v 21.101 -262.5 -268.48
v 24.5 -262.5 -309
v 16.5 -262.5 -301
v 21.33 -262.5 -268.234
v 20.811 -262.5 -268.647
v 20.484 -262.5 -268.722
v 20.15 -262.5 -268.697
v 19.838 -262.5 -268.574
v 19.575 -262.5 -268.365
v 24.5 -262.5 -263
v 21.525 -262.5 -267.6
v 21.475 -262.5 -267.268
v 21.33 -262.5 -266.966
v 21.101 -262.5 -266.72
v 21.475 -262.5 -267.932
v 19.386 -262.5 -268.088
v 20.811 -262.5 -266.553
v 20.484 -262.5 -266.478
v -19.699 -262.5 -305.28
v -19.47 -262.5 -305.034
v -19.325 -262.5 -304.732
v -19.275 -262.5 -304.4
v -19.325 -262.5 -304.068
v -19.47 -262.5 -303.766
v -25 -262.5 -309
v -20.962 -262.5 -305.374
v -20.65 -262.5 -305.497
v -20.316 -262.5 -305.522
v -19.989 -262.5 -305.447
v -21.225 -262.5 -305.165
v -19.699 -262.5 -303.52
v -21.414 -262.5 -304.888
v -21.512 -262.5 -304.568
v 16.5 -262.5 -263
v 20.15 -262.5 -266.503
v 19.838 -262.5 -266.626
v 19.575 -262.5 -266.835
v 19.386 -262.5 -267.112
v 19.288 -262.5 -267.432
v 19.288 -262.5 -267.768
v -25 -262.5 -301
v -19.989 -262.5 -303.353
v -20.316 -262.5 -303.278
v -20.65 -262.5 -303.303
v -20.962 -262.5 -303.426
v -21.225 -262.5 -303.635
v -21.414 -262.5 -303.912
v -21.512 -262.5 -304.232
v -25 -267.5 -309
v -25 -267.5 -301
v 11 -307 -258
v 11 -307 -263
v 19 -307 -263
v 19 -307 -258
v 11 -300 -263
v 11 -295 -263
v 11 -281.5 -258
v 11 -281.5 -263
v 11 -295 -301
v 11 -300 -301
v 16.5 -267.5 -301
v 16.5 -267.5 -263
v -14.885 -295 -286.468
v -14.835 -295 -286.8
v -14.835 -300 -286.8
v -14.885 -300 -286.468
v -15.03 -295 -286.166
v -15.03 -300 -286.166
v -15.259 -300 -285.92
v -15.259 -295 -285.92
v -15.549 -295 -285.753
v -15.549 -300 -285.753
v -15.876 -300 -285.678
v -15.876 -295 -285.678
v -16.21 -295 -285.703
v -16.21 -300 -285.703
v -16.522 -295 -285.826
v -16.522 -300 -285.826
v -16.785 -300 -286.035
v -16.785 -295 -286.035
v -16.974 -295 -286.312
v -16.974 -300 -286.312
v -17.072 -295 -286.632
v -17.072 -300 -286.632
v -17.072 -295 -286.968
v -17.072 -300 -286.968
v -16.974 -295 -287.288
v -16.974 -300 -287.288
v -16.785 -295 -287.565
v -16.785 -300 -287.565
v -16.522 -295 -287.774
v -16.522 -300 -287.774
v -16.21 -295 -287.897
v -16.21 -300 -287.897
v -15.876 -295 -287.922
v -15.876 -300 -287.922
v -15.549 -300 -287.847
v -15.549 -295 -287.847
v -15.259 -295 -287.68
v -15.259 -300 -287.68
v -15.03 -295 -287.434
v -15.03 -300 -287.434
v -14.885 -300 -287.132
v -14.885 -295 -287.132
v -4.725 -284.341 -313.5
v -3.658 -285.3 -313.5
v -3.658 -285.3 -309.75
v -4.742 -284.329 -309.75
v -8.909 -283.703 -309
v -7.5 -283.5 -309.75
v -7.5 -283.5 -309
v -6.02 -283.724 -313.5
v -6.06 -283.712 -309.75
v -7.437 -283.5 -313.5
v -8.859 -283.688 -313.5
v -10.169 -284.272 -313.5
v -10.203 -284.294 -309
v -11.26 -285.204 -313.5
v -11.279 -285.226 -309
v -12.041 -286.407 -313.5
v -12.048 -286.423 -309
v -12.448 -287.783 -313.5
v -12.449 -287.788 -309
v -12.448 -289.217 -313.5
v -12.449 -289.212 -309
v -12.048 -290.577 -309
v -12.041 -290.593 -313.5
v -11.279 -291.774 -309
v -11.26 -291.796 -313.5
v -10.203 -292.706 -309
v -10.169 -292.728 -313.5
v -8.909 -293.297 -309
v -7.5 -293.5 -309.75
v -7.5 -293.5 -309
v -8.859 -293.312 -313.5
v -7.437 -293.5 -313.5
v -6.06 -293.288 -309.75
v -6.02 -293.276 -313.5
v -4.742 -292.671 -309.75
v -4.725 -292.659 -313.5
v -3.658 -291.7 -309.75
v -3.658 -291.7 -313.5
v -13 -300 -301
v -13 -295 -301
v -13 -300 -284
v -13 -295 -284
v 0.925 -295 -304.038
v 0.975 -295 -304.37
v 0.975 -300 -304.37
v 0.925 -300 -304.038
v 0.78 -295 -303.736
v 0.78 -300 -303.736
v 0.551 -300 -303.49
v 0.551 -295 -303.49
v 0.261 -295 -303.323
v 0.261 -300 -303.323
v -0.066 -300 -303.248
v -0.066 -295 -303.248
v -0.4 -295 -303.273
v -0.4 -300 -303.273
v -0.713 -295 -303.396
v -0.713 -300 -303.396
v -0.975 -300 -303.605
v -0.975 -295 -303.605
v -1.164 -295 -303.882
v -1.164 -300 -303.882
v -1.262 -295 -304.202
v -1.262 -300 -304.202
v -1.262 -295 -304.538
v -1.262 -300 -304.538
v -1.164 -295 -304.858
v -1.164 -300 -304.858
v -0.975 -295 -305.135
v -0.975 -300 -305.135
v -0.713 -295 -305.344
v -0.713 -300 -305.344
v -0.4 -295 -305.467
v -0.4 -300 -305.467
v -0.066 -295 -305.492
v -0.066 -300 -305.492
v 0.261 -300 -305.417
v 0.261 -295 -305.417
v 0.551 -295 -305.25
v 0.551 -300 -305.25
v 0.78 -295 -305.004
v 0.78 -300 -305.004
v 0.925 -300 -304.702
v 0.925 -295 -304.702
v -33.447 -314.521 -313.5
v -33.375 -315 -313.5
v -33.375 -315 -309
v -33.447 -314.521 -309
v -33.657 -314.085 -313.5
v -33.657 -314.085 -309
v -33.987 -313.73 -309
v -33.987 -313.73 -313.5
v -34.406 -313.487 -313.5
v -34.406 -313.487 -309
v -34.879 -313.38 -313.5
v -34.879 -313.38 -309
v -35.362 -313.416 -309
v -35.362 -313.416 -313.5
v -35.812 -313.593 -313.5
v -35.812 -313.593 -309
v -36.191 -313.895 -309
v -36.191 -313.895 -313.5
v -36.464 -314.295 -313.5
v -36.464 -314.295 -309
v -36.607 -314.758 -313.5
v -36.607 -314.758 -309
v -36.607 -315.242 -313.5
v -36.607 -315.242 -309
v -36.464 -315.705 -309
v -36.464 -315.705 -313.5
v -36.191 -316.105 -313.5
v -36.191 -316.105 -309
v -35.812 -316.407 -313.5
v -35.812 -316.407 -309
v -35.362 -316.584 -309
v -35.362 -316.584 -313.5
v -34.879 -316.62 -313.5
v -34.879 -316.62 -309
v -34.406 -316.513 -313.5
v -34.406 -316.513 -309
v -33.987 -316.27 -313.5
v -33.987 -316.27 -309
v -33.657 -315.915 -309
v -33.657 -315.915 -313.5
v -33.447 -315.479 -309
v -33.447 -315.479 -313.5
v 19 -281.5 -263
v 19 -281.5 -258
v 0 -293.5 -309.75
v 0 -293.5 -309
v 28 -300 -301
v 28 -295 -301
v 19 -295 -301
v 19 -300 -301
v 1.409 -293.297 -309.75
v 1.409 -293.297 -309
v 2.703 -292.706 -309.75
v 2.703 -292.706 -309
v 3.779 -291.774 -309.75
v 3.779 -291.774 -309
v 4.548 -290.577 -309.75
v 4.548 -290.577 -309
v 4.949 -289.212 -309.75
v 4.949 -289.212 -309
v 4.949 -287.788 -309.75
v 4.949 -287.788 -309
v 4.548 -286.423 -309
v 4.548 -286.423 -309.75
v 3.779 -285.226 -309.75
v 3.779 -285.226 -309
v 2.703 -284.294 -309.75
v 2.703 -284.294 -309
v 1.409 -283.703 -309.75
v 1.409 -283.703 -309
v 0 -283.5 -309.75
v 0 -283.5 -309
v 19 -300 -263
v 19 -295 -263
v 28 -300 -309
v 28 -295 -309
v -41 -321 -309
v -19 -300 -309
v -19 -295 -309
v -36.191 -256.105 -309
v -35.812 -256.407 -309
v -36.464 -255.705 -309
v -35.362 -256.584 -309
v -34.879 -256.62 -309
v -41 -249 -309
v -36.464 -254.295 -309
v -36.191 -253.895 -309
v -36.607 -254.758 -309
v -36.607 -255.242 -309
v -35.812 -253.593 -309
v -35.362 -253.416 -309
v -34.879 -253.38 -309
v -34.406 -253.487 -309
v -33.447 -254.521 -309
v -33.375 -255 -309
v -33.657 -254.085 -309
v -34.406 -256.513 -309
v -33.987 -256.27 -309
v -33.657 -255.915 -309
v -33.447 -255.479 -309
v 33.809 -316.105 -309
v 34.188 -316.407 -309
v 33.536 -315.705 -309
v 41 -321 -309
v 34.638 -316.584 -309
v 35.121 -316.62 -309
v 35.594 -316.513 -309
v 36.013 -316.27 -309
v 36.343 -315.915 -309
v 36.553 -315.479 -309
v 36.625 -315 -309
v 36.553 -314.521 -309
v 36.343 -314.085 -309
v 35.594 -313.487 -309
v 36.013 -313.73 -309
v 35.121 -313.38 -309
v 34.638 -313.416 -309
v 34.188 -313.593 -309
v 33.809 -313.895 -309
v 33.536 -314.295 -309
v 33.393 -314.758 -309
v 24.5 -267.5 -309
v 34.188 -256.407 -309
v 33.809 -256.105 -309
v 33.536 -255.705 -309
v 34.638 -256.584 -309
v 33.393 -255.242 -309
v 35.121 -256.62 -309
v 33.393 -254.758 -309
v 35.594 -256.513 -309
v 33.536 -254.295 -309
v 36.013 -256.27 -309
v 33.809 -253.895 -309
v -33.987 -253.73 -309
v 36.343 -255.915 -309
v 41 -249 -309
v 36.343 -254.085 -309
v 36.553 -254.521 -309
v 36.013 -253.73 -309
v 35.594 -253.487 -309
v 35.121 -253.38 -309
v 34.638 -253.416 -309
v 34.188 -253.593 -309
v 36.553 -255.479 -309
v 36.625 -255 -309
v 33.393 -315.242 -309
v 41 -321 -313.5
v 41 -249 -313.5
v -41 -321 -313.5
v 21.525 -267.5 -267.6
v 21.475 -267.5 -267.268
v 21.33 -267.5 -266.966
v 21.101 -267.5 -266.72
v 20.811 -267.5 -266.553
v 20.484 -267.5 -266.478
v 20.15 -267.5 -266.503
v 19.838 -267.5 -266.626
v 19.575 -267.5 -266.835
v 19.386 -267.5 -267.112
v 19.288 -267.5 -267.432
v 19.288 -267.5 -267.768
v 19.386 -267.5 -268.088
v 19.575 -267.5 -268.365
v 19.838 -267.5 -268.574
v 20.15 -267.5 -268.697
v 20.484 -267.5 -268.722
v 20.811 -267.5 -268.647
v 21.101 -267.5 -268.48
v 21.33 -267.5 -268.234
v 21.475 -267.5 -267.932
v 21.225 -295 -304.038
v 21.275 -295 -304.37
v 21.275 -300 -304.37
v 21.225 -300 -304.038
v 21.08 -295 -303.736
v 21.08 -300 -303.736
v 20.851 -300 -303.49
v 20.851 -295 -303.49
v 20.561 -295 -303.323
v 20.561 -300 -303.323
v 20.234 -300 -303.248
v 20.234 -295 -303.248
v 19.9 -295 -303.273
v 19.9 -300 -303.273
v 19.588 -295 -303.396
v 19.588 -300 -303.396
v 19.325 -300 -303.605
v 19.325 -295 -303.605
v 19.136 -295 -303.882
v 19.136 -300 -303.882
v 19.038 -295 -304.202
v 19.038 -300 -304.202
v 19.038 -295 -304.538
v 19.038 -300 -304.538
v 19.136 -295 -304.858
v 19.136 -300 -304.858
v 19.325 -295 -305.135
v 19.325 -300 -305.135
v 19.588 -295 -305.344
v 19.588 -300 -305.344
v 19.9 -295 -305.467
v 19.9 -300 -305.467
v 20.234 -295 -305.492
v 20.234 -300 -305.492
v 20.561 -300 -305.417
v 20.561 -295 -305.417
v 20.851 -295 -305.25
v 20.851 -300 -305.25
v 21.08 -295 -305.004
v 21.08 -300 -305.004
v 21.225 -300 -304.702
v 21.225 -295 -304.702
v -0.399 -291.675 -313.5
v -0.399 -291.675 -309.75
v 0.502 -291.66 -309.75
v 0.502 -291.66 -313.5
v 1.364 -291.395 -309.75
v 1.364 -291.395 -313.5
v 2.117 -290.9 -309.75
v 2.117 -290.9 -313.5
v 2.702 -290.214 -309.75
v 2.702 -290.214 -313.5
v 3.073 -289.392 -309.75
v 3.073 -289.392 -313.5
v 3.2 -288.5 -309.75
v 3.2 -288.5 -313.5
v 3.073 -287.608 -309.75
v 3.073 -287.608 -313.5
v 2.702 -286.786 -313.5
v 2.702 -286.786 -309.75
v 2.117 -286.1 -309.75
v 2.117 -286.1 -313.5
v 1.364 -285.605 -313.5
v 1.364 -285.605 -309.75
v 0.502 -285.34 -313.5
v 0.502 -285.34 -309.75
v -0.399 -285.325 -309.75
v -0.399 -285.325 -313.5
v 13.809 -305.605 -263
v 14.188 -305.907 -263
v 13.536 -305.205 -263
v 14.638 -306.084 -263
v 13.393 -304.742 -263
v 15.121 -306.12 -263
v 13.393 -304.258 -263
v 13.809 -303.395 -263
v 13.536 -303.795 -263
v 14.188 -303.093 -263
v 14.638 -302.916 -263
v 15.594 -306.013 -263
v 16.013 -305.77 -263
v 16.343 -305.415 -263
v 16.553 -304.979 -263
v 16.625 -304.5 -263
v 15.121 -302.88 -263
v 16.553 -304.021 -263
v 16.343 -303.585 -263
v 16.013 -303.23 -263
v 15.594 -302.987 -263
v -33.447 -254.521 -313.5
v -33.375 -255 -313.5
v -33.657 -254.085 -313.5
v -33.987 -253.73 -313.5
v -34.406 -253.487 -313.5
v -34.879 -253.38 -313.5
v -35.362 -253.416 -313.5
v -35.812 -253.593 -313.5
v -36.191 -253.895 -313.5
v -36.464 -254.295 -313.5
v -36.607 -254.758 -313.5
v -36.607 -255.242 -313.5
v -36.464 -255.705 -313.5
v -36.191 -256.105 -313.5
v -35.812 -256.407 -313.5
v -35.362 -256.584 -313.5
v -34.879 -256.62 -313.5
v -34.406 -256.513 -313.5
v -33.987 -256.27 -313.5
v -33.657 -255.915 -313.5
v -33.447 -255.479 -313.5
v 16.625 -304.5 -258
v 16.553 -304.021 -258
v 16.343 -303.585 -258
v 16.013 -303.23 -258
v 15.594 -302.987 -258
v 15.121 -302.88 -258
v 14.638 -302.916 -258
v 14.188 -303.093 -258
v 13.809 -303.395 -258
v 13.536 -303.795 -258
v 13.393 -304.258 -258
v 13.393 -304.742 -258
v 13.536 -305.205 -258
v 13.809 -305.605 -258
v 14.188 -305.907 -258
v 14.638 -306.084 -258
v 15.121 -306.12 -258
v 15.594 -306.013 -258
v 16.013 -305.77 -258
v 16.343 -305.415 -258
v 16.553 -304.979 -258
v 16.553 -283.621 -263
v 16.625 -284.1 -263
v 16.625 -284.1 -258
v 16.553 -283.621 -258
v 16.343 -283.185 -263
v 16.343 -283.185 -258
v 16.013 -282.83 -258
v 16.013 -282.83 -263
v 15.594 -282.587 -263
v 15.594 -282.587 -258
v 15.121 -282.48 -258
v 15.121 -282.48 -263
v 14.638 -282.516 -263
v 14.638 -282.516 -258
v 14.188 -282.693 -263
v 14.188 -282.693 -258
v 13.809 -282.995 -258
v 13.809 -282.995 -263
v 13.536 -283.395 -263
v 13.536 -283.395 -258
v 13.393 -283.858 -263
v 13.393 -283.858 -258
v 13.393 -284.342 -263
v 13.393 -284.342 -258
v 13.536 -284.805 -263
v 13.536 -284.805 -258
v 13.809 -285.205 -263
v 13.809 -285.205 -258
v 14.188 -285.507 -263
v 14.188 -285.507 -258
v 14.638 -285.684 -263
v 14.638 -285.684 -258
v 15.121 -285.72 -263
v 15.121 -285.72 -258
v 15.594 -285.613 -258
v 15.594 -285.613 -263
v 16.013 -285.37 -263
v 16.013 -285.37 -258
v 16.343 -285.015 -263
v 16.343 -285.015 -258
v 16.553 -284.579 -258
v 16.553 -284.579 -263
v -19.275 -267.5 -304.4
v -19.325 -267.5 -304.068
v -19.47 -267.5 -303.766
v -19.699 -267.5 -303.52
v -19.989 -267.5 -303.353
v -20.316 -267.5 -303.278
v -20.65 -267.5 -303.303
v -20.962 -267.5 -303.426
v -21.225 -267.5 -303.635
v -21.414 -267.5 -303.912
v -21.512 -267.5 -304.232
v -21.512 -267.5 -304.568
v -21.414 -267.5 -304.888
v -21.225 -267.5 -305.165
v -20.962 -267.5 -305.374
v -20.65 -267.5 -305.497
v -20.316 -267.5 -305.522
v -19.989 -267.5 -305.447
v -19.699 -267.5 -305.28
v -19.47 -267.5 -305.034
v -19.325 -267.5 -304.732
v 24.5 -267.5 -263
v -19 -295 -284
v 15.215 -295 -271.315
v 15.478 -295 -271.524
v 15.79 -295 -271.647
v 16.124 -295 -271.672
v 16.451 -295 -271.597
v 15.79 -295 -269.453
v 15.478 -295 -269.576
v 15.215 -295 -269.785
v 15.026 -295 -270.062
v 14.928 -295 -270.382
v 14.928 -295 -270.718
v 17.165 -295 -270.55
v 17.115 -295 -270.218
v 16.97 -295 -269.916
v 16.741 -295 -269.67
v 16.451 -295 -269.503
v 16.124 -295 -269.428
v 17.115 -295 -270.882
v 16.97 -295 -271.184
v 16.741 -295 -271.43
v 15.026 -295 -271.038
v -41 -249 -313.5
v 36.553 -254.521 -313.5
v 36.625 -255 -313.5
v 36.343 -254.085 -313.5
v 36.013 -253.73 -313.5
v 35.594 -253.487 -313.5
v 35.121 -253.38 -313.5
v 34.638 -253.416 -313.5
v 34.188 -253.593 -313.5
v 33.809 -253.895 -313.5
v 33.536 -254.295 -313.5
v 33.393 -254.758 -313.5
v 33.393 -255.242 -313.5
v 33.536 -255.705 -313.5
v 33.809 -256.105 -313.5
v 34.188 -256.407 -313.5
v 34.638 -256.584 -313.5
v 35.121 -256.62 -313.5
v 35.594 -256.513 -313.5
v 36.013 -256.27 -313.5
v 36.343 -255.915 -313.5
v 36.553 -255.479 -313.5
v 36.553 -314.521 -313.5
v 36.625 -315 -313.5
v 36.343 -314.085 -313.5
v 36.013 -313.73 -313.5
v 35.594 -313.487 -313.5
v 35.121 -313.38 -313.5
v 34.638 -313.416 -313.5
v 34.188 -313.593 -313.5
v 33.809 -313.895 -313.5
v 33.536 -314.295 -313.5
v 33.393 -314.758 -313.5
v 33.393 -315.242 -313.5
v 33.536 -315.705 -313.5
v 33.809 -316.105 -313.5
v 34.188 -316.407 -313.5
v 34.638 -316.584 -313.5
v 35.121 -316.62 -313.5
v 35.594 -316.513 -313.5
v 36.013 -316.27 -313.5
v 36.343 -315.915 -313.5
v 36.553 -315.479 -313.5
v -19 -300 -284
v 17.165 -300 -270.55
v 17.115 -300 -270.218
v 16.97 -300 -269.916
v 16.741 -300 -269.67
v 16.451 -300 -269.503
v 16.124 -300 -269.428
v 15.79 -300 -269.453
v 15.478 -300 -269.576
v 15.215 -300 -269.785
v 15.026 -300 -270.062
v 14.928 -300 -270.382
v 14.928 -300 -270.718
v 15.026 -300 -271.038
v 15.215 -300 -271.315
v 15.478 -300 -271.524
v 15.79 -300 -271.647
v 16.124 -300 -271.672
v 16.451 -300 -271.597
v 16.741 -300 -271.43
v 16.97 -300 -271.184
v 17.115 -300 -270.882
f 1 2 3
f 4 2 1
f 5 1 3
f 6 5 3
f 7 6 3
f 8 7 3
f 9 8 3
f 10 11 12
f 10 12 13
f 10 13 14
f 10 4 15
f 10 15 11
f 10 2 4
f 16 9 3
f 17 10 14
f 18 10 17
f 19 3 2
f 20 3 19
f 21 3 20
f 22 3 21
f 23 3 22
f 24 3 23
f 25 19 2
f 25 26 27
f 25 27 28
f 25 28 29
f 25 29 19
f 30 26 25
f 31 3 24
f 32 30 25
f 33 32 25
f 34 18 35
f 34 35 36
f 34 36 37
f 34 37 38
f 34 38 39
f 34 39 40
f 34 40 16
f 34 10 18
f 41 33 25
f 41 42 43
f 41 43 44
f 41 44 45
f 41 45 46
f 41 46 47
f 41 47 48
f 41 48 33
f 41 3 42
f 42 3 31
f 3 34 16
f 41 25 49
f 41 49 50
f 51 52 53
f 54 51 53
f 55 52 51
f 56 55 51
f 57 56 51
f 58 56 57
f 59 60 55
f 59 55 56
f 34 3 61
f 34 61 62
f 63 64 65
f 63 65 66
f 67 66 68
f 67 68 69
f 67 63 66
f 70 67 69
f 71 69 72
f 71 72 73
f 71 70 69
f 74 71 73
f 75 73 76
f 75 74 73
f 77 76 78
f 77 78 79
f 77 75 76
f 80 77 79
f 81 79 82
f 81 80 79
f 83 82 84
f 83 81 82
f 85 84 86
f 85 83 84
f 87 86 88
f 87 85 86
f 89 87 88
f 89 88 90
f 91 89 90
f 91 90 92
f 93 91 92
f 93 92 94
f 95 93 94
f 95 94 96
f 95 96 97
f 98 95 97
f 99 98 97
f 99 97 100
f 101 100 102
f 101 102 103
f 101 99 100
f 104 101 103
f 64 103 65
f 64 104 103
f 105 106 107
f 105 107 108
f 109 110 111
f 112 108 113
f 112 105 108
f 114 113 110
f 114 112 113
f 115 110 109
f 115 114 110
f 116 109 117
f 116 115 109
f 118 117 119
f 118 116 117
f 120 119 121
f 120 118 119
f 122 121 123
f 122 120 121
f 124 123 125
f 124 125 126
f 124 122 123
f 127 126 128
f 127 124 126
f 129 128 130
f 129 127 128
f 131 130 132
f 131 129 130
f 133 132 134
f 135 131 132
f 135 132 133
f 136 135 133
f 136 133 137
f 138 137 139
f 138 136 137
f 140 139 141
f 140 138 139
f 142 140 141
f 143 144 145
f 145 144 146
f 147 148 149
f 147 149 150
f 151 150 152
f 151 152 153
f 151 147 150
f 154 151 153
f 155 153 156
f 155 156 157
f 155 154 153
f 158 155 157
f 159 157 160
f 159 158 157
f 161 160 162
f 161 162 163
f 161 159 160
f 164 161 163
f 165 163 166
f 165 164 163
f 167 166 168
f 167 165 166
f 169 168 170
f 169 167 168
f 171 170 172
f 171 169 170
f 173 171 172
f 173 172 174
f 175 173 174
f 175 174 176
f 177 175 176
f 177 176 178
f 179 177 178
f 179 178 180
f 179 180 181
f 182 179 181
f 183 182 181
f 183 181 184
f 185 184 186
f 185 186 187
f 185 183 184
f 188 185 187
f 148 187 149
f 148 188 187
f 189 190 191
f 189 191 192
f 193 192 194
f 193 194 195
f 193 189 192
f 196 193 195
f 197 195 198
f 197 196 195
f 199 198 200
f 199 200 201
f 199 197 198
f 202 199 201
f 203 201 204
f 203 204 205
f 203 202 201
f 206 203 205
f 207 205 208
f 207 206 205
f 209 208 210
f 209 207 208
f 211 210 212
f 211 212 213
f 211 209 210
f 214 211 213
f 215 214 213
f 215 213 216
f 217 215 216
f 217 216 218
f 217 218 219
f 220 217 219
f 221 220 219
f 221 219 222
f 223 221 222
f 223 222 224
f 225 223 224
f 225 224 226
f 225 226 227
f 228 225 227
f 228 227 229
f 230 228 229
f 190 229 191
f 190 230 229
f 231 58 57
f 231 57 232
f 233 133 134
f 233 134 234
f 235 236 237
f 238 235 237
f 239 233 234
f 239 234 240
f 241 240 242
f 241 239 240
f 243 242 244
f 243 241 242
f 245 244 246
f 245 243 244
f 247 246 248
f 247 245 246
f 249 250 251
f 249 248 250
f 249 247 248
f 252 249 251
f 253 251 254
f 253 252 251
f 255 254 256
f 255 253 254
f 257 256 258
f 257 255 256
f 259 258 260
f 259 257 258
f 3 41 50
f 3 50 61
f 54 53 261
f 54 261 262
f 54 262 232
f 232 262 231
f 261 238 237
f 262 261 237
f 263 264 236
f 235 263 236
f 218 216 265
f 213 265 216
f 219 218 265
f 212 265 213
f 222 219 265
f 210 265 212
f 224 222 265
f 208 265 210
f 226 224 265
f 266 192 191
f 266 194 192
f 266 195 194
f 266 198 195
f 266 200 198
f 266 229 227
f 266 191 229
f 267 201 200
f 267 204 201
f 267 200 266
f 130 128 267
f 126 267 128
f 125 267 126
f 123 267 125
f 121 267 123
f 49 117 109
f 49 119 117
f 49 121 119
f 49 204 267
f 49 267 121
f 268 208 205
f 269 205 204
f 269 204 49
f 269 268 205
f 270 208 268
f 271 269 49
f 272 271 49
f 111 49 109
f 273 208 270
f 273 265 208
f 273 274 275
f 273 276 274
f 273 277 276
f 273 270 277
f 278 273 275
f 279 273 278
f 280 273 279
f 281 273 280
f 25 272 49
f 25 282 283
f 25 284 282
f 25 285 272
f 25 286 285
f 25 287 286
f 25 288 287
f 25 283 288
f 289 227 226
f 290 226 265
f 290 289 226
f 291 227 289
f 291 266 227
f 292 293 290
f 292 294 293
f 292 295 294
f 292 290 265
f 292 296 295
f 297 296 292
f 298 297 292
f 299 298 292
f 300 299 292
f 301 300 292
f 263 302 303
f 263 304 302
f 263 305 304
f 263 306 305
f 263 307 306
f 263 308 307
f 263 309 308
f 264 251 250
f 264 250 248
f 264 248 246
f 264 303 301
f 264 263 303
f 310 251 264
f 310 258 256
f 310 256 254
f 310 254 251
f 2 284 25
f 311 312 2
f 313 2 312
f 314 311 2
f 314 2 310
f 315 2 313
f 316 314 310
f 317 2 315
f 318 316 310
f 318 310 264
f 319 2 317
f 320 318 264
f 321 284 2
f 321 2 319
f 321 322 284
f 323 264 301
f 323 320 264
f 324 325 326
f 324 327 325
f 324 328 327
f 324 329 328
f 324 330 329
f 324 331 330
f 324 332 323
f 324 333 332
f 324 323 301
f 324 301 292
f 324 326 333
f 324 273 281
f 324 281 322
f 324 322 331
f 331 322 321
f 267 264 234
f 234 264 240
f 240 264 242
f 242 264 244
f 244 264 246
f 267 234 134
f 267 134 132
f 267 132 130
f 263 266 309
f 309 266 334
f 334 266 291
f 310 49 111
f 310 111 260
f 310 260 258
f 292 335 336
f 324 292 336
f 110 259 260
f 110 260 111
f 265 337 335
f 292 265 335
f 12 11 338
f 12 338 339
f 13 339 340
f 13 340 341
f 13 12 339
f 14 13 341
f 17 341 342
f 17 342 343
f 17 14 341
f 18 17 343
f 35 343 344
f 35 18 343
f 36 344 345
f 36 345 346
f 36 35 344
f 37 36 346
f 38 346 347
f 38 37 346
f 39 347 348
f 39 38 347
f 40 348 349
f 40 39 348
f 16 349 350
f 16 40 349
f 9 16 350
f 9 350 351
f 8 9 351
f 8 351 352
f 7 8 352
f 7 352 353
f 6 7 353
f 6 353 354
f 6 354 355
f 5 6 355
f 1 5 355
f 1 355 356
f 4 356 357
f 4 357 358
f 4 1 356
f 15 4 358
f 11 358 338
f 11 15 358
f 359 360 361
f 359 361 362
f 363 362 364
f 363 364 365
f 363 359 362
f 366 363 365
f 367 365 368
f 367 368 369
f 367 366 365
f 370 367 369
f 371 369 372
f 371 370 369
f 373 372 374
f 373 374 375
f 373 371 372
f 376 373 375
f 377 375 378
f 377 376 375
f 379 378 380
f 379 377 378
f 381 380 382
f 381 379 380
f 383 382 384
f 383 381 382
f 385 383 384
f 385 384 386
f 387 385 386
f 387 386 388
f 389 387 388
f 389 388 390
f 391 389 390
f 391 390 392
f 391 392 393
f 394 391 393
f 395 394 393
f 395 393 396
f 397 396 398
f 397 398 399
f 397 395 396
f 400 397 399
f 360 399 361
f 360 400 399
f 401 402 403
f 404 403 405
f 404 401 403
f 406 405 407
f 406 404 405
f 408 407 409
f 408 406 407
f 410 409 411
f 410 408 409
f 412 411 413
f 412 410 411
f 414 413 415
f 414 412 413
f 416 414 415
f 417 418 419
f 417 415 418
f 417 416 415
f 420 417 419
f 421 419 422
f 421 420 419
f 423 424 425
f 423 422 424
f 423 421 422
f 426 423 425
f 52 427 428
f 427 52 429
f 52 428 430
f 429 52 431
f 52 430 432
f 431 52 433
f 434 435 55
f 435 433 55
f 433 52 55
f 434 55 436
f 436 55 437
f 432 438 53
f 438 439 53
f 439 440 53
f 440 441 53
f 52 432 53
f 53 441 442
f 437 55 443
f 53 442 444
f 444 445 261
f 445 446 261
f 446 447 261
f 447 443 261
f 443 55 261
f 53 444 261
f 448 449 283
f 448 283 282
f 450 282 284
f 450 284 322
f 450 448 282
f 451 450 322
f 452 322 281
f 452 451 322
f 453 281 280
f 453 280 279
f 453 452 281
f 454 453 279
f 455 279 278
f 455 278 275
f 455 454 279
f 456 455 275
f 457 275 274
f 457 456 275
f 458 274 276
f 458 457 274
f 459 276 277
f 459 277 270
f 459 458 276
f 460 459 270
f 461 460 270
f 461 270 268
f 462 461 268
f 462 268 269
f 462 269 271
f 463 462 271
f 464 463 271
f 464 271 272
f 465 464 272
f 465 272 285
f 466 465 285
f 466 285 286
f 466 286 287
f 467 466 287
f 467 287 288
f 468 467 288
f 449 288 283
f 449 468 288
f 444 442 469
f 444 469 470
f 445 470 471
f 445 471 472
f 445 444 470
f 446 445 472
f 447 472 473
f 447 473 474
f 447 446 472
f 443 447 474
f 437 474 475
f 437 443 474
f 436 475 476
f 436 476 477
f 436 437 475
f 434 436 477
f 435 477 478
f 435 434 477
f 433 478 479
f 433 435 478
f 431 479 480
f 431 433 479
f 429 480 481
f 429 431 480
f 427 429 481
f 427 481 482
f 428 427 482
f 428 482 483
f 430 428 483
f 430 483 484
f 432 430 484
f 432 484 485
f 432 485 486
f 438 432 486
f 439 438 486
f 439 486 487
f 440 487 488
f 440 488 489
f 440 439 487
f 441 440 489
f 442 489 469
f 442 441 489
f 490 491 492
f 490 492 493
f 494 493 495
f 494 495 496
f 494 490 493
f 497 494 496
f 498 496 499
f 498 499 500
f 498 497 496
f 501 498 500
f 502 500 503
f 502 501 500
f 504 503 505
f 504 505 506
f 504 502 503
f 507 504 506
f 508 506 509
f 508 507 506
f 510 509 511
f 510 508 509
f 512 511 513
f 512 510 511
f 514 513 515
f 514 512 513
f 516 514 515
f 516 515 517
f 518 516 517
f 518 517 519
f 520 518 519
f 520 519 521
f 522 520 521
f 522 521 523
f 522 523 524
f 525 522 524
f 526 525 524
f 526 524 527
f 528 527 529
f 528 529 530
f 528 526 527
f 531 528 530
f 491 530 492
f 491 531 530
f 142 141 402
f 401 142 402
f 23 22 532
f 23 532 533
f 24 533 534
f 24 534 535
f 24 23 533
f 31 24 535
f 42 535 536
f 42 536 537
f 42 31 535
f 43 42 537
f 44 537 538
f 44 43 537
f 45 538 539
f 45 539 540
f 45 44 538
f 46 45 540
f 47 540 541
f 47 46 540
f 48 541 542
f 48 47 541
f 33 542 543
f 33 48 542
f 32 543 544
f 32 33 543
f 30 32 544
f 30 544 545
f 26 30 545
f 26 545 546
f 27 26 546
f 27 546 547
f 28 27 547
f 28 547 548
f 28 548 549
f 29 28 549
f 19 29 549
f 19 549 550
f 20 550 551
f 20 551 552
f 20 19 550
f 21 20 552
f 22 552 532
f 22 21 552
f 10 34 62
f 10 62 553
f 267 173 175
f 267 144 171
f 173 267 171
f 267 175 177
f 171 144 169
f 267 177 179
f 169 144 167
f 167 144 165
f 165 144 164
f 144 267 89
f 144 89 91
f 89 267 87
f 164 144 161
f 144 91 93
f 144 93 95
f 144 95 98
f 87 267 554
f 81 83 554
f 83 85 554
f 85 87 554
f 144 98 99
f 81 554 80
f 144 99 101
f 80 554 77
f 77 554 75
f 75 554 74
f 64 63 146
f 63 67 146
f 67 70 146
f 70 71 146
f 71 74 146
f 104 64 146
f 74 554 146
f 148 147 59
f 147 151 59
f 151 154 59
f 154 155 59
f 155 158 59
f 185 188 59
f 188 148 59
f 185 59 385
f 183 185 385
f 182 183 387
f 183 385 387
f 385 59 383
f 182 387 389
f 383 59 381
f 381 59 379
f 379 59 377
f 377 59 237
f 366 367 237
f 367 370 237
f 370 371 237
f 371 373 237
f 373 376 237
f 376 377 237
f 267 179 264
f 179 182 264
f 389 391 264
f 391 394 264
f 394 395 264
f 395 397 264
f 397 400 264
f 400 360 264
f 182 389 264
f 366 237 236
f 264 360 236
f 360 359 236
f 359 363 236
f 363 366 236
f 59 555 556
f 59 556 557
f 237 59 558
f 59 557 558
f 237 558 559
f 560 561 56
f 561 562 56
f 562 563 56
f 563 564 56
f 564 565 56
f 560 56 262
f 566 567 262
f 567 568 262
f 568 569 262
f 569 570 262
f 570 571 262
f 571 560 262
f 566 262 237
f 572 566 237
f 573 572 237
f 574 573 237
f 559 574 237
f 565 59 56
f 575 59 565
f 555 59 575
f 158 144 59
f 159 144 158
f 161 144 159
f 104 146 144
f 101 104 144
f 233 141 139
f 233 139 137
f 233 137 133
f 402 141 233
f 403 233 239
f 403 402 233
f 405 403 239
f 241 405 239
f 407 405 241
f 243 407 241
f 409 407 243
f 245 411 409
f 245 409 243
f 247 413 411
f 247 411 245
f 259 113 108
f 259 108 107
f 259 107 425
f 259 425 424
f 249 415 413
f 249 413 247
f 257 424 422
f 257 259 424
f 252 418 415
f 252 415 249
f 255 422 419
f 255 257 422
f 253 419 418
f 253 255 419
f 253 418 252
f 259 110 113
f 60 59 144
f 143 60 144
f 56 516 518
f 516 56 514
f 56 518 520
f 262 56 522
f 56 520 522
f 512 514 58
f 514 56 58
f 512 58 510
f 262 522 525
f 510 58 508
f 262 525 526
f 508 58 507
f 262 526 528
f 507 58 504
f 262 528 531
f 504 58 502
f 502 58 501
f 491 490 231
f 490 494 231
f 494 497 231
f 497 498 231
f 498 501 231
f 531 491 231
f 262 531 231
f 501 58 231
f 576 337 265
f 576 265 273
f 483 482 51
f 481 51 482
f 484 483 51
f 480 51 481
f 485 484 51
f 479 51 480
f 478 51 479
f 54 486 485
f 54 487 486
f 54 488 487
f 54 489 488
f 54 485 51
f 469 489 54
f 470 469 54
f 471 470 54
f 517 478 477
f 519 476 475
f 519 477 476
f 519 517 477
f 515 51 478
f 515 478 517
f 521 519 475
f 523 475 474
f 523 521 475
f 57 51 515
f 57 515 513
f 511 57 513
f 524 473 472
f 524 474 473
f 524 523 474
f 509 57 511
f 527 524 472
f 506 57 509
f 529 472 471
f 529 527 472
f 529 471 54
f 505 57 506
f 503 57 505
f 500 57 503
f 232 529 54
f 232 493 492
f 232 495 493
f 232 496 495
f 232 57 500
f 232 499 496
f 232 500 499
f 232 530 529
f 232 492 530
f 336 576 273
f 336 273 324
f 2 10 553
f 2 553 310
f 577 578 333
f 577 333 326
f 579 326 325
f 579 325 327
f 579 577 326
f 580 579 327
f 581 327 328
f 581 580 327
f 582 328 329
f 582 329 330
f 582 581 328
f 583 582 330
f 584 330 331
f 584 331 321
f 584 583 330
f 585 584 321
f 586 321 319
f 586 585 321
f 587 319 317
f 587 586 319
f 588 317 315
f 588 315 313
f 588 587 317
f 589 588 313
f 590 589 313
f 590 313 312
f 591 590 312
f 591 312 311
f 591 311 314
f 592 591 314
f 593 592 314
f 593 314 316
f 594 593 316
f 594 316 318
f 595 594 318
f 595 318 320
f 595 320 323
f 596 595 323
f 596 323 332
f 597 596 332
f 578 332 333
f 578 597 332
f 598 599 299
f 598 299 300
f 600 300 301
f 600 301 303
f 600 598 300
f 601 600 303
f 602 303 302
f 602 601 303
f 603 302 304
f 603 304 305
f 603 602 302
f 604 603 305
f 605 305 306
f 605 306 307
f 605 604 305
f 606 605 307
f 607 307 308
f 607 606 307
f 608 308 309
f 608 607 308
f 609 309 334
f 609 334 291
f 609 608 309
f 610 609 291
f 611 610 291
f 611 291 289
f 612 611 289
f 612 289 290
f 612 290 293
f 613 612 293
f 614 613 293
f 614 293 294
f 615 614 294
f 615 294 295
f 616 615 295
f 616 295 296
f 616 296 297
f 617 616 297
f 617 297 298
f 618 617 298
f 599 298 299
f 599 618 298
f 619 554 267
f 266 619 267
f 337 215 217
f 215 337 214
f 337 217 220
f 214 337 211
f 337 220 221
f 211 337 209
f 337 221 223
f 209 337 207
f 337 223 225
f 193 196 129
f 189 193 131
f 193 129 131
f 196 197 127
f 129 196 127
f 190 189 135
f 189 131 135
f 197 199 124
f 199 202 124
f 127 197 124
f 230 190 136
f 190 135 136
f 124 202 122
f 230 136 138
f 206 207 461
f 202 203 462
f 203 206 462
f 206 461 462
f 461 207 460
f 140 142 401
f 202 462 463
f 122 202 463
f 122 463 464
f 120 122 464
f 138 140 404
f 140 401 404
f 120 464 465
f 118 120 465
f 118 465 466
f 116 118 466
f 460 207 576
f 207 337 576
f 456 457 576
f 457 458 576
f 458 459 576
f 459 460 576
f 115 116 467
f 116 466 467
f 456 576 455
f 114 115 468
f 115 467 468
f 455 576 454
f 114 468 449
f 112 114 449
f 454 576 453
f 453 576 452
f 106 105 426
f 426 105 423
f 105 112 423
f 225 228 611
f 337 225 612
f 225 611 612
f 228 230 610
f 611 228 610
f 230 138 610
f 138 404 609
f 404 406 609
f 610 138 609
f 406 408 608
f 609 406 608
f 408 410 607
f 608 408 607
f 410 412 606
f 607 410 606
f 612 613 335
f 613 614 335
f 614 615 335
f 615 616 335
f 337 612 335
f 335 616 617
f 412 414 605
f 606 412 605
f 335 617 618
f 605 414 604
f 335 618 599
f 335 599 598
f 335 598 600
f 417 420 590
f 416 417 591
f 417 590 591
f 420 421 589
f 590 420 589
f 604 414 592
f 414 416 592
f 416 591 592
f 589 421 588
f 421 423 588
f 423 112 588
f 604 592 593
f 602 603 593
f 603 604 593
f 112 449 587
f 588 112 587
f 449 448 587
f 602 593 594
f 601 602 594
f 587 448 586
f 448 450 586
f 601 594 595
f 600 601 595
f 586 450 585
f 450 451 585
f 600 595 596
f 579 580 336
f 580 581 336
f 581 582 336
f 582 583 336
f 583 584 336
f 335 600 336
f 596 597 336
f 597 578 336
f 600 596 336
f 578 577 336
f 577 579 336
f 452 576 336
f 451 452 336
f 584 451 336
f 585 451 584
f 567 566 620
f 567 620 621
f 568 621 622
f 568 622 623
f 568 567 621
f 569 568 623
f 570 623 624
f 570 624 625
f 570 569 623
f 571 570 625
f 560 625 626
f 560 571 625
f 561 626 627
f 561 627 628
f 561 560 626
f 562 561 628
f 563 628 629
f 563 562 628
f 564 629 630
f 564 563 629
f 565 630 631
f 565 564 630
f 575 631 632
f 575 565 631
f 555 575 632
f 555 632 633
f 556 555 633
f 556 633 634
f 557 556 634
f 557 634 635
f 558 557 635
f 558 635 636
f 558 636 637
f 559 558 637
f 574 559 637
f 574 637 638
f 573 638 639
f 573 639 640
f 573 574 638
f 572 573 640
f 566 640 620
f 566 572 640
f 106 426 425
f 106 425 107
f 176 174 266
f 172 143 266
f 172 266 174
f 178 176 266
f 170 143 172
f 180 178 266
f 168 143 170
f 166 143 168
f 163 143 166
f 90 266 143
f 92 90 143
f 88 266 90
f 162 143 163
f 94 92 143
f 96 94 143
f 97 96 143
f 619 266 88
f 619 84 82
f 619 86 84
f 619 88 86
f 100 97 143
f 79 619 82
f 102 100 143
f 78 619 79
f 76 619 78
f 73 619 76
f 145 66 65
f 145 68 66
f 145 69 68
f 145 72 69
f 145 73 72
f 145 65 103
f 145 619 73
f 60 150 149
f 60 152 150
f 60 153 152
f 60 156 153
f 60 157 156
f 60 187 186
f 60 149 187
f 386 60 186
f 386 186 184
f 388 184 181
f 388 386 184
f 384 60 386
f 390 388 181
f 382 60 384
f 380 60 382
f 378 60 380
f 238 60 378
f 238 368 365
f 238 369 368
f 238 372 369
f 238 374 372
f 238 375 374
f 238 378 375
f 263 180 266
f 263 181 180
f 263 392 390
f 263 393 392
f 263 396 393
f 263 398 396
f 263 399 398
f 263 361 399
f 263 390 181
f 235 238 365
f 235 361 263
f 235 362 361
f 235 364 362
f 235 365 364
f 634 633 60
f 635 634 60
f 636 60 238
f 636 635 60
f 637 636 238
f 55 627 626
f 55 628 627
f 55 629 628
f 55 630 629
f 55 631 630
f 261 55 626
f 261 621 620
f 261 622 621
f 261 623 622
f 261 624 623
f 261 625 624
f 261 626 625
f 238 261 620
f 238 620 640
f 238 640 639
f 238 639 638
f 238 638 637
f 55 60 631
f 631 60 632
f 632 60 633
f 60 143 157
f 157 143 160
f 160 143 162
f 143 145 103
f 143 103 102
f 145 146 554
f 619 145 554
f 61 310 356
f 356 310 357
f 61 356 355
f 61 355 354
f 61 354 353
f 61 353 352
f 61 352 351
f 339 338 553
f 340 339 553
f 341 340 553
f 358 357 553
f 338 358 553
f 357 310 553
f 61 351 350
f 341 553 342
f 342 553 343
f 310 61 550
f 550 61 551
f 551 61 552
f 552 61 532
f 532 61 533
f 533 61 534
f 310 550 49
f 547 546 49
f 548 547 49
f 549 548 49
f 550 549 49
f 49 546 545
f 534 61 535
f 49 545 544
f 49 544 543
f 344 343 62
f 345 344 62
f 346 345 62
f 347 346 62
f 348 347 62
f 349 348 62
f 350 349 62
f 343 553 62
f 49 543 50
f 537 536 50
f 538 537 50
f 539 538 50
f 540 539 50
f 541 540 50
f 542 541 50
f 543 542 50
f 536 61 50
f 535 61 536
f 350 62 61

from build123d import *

# Parameters (mm, degrees)
EXTRUDE031_DEPTH = 5
SKETCH021_R      = 1.125
EXTRUDE005_DEPTH = 5
SKETCH020_W      = 8
SKETCH020_H      = 25.5
SKETCH020_R      = 1.625
EXTRUDE004_DEPTH = 5
SKETCH019_R      = 1.125
EXTRUDE003_DEPTH = 5
SKETCH093_W      = 82
SKETCH093_H      = 72
SKETCH093_R      = 1.625
EXTRUDE030_DEPTH = 4.5


with BuildPart() as basemiccut:
    # Sketch094 → Extrude031 (new body)
    with BuildSketch(Plane.XY):
        with BuildLine():
            ThreePointArc((-7.5, -283.5), (-12.5, -288.5), (-7.5, -293.5))
            Line((-7.5, -293.5), (0, -293.5))
            ThreePointArc((0, -293.5), (5, -288.5), (0, -283.5))
            Line((0, -283.5), (-7.5, -283.5))
        make_face()
    extrude(amount=EXTRUDE031_DEPTH)


with BuildPart() as basemiccut_1:
    # Extrude031 placement: moved
    add(basemiccut.part.moved(Location((0, 0, -309.75))))


with BuildPart() as ipshold:
    # Sketch021 (on Extrude) → Extrude005 (new body)
    with BuildSketch(Plane.XZ):
        Polygon((-25, -309), (-25, -301), (16.5, -301), (16.5, -263), (24.5, -263), (24.5, -309), align=None)
        with Locations((-20.4, -304.4)):
            Circle(SKETCH021_R, mode=Mode.SUBTRACT)
        with Locations((20.4, -267.6)):
            Circle(SKETCH021_R, mode=Mode.SUBTRACT)
    extrude(amount=EXTRUDE005_DEPTH)


with BuildPart() as ipshold_1:
    # Extrude005 placement: moved
    add(ipshold.part.moved(Location((0, -262.5, 0))))


with BuildPart() as gpshold:
    # Sketch020 → Extrude004 (new body)
    with BuildSketch(Plane.XY.offset(-263)):
        with Locations((15, -294.25)):
            Rectangle(SKETCH020_W, SKETCH020_H)
        with Locations((15, -284.1)):
            Circle(SKETCH020_R, mode=Mode.SUBTRACT)
        with Locations((15, -304.5)):
            Circle(SKETCH020_R, mode=Mode.SUBTRACT)
    extrude(amount=EXTRUDE004_DEPTH)


with BuildPart() as i2chold:
    # Sketch019 → Extrude003 (new body)
    with BuildSketch(Plane.XZ.offset(295)):
        Polygon((28, -309), (28, -301), (19, -301), (19, -263), (11, -263), (11, -301), (-13, -301), (-13, -284), (-19, -284), (-19, -309), align=None)
        with Locations((-15.96, -286.8)):
            Circle(SKETCH019_R, mode=Mode.SUBTRACT)
        with Locations((-0.15, -304.37)):
            Circle(SKETCH019_R, mode=Mode.SUBTRACT)
        with Locations((20.15, -304.37)):
            Circle(SKETCH019_R, mode=Mode.SUBTRACT)
        with Locations((16.04, -270.55)):
            Circle(SKETCH019_R, mode=Mode.SUBTRACT)
    extrude(amount=EXTRUDE003_DEPTH)


with BuildPart() as base012:
    # Sketch093 → Extrude030 (new body)
    with BuildSketch(Plane.XY):
        with Locations((0, -285)):
            Rectangle(SKETCH093_W, SKETCH093_H)
        with Locations((-35, -315)):
            Circle(SKETCH093_R, mode=Mode.SUBTRACT)
        with Locations((35, -315)):
            Circle(SKETCH093_R, mode=Mode.SUBTRACT)
        with Locations((35, -255)):
            Circle(SKETCH093_R, mode=Mode.SUBTRACT)
        with Locations((-35, -255)):
            Circle(SKETCH093_R, mode=Mode.SUBTRACT)
        with BuildLine():
            ThreePointArc((-3.658125, -285.3), (-12.5, -288.5), (-3.658125, -291.7))
            Line((-3.658125, -291.7), (-0.399218, -291.675))
            ThreePointArc((-0.399218, -291.675), (3.2, -288.5), (-0.399218, -285.325))
            Line((-0.399218, -285.325), (-3.658125, -285.3))
        make_face(mode=Mode.SUBTRACT)
    extrude(amount=EXTRUDE030_DEPTH)


with BuildPart() as base012_1:
    # Extrude030 placement: moved
    add(base012.part.moved(Location((0, 0, -313.5))))

    # Fusion078: union ipsHold, gpsHold, i2cHold
    add(ipshold_1.part)
    add(gpshold.part)
    add(i2chold.part)

    # Cut035: cut baseMicCut
    add(basemiccut_1.part, mode=Mode.SUBTRACT)


solid = base012_1.part
